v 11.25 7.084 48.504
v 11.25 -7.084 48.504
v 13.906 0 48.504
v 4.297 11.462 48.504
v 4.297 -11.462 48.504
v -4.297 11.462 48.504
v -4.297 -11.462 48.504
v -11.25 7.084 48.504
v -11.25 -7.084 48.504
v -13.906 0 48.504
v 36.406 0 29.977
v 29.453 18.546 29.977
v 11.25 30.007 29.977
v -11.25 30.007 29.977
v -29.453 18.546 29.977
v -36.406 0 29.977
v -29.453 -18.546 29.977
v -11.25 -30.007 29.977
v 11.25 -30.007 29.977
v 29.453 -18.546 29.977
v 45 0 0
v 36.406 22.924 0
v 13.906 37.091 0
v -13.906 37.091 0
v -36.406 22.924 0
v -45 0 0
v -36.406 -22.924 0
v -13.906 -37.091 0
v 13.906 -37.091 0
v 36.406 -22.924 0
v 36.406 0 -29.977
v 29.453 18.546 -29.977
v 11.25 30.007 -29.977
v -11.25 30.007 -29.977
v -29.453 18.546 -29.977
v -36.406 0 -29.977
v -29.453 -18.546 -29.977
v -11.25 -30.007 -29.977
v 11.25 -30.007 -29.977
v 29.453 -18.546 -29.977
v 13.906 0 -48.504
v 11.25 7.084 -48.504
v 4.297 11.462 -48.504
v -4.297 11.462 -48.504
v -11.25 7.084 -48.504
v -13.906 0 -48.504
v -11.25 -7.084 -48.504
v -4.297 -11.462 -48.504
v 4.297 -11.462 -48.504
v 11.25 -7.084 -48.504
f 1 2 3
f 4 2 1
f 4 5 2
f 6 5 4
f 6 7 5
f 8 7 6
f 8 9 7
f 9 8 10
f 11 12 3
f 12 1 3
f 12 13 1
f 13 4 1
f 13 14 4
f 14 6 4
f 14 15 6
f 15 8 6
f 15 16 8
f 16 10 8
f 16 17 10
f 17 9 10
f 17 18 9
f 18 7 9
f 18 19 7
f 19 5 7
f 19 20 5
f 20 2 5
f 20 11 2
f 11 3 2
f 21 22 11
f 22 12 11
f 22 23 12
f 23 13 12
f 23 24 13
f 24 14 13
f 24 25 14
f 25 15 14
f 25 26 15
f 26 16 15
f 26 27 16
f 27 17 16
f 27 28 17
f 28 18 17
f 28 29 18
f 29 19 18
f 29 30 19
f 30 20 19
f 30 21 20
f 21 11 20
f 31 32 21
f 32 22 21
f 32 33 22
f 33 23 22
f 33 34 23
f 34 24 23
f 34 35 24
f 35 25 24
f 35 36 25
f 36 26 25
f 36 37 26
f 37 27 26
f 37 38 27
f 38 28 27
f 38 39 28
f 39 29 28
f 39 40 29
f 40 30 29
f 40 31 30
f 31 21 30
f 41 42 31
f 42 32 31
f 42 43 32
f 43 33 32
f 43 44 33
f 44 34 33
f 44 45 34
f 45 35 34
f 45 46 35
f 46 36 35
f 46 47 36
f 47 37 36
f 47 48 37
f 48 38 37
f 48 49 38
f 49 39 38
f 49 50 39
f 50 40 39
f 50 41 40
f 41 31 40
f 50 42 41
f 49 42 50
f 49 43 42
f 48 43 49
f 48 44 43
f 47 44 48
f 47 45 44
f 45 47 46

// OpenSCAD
// Generated by SolidPython 1.0.1 on 2020-07-29 00:46:52


scale(v = [15, 13, 17]) {
	sphere(r = 3);
}
/***********************************************
*********      SolidPython code:      **********
************************************************
 
# import packages: SolidPython
from solid import *
from solid.utils import *
from itertools import chain, combinations, permutations


class Resize:

    def __init__(self, scad_file):
        self.scad_file = scad_file
        #self.scad_file = import_scad(scad_file)
        # cone/cylinder param:
        self.r1 = 0
        self.r2 = 0
        self.h = 0
        # rectangular prism param:
        self.w = 0
        self.l = 0
        # ellipse param:
        self.r = 0

    # import OpenScad code (file name corresponds to shape)


    # classify shape + parameters
    def assign(self, param1, param2, param3):
        if self.scad_file == 'cone.scad':
            self.r1 = param1
            self.r2 = param2
            self.h = param3
        elif self.scad_file == 'cylinder.scad':
            self.r1 = param1
            self.r2 = param2
            self.h = param3
        elif self.scad_file == 'rectangularPrism.scad':
            self.h = param1
            self.l = param2
            self.w = param3
        else:
            self.r = param1
            self.h = param2

    # resize parameters
    def iterate(self):
        x = range(3, 20, 2)
        i = 1
        if self.scad_file == 'cone.scad':
            tempList = list(permutations(x, 2))
            for temp in tempList:
                param1 = temp[0]
                param2 = temp[1]
                filepath = 'produced_scad_files/' + 'cone' + str(param1) + '_' + str(param2) + '_' + '.scad'
                scad_render_to_file(cylinder(h=param1, r1=param2, r2=0), filepath)

        elif self.scad_file == 'cylinder.scad':
            tempList = list(permutations(x, 3))
            for temp in tempList:
                param1 = temp[0]
                param2 = temp[1]
                filepath = 'produced_scad_files/' + 'cylinder' + str(param1) + '_' + str(param2) + '_' + '.scad'
                scad_render_to_file(cylinder(h=param1, r1=param2, r2=param2), filepath)

        elif self.scad_file == 'rectangularPrism.scad':
            tempList = list(permutations(x, 3))
            for temp in tempList:
                param1 = temp[0]
                param2 = temp[1]
                param3 = temp[2]
                filepath = 'produced_scad_files/' + 'rectangularPrism' + str(param1) + '_' + str(param2) + '_' + str(
                    param3) + '.scad'
                scad_render_to_file(cube(size=(param1, param2, param3)), filepath)

        elif self.scad_file == 'ellipse.scad':
            tempList = list(permutations(x, 4))
            for temp in tempList:
                param1 = temp[0]
                param2 = temp[1]
                param3 = temp[2]
                param4 = temp[3]
                filepath = 'produced_scad_files/' + 'ellipse' + str(param1) + '_' + str(param2) + '_' + str(param3) + '_' + str(param4) + '.scad'
                scad_render_to_file(scale([param1, param2, param3])(sphere(r=param4)), filepath)

    def render_to_scadfile(self):
        scad_render_to_file(scad, 'example.scad') 
 
************************************************/
